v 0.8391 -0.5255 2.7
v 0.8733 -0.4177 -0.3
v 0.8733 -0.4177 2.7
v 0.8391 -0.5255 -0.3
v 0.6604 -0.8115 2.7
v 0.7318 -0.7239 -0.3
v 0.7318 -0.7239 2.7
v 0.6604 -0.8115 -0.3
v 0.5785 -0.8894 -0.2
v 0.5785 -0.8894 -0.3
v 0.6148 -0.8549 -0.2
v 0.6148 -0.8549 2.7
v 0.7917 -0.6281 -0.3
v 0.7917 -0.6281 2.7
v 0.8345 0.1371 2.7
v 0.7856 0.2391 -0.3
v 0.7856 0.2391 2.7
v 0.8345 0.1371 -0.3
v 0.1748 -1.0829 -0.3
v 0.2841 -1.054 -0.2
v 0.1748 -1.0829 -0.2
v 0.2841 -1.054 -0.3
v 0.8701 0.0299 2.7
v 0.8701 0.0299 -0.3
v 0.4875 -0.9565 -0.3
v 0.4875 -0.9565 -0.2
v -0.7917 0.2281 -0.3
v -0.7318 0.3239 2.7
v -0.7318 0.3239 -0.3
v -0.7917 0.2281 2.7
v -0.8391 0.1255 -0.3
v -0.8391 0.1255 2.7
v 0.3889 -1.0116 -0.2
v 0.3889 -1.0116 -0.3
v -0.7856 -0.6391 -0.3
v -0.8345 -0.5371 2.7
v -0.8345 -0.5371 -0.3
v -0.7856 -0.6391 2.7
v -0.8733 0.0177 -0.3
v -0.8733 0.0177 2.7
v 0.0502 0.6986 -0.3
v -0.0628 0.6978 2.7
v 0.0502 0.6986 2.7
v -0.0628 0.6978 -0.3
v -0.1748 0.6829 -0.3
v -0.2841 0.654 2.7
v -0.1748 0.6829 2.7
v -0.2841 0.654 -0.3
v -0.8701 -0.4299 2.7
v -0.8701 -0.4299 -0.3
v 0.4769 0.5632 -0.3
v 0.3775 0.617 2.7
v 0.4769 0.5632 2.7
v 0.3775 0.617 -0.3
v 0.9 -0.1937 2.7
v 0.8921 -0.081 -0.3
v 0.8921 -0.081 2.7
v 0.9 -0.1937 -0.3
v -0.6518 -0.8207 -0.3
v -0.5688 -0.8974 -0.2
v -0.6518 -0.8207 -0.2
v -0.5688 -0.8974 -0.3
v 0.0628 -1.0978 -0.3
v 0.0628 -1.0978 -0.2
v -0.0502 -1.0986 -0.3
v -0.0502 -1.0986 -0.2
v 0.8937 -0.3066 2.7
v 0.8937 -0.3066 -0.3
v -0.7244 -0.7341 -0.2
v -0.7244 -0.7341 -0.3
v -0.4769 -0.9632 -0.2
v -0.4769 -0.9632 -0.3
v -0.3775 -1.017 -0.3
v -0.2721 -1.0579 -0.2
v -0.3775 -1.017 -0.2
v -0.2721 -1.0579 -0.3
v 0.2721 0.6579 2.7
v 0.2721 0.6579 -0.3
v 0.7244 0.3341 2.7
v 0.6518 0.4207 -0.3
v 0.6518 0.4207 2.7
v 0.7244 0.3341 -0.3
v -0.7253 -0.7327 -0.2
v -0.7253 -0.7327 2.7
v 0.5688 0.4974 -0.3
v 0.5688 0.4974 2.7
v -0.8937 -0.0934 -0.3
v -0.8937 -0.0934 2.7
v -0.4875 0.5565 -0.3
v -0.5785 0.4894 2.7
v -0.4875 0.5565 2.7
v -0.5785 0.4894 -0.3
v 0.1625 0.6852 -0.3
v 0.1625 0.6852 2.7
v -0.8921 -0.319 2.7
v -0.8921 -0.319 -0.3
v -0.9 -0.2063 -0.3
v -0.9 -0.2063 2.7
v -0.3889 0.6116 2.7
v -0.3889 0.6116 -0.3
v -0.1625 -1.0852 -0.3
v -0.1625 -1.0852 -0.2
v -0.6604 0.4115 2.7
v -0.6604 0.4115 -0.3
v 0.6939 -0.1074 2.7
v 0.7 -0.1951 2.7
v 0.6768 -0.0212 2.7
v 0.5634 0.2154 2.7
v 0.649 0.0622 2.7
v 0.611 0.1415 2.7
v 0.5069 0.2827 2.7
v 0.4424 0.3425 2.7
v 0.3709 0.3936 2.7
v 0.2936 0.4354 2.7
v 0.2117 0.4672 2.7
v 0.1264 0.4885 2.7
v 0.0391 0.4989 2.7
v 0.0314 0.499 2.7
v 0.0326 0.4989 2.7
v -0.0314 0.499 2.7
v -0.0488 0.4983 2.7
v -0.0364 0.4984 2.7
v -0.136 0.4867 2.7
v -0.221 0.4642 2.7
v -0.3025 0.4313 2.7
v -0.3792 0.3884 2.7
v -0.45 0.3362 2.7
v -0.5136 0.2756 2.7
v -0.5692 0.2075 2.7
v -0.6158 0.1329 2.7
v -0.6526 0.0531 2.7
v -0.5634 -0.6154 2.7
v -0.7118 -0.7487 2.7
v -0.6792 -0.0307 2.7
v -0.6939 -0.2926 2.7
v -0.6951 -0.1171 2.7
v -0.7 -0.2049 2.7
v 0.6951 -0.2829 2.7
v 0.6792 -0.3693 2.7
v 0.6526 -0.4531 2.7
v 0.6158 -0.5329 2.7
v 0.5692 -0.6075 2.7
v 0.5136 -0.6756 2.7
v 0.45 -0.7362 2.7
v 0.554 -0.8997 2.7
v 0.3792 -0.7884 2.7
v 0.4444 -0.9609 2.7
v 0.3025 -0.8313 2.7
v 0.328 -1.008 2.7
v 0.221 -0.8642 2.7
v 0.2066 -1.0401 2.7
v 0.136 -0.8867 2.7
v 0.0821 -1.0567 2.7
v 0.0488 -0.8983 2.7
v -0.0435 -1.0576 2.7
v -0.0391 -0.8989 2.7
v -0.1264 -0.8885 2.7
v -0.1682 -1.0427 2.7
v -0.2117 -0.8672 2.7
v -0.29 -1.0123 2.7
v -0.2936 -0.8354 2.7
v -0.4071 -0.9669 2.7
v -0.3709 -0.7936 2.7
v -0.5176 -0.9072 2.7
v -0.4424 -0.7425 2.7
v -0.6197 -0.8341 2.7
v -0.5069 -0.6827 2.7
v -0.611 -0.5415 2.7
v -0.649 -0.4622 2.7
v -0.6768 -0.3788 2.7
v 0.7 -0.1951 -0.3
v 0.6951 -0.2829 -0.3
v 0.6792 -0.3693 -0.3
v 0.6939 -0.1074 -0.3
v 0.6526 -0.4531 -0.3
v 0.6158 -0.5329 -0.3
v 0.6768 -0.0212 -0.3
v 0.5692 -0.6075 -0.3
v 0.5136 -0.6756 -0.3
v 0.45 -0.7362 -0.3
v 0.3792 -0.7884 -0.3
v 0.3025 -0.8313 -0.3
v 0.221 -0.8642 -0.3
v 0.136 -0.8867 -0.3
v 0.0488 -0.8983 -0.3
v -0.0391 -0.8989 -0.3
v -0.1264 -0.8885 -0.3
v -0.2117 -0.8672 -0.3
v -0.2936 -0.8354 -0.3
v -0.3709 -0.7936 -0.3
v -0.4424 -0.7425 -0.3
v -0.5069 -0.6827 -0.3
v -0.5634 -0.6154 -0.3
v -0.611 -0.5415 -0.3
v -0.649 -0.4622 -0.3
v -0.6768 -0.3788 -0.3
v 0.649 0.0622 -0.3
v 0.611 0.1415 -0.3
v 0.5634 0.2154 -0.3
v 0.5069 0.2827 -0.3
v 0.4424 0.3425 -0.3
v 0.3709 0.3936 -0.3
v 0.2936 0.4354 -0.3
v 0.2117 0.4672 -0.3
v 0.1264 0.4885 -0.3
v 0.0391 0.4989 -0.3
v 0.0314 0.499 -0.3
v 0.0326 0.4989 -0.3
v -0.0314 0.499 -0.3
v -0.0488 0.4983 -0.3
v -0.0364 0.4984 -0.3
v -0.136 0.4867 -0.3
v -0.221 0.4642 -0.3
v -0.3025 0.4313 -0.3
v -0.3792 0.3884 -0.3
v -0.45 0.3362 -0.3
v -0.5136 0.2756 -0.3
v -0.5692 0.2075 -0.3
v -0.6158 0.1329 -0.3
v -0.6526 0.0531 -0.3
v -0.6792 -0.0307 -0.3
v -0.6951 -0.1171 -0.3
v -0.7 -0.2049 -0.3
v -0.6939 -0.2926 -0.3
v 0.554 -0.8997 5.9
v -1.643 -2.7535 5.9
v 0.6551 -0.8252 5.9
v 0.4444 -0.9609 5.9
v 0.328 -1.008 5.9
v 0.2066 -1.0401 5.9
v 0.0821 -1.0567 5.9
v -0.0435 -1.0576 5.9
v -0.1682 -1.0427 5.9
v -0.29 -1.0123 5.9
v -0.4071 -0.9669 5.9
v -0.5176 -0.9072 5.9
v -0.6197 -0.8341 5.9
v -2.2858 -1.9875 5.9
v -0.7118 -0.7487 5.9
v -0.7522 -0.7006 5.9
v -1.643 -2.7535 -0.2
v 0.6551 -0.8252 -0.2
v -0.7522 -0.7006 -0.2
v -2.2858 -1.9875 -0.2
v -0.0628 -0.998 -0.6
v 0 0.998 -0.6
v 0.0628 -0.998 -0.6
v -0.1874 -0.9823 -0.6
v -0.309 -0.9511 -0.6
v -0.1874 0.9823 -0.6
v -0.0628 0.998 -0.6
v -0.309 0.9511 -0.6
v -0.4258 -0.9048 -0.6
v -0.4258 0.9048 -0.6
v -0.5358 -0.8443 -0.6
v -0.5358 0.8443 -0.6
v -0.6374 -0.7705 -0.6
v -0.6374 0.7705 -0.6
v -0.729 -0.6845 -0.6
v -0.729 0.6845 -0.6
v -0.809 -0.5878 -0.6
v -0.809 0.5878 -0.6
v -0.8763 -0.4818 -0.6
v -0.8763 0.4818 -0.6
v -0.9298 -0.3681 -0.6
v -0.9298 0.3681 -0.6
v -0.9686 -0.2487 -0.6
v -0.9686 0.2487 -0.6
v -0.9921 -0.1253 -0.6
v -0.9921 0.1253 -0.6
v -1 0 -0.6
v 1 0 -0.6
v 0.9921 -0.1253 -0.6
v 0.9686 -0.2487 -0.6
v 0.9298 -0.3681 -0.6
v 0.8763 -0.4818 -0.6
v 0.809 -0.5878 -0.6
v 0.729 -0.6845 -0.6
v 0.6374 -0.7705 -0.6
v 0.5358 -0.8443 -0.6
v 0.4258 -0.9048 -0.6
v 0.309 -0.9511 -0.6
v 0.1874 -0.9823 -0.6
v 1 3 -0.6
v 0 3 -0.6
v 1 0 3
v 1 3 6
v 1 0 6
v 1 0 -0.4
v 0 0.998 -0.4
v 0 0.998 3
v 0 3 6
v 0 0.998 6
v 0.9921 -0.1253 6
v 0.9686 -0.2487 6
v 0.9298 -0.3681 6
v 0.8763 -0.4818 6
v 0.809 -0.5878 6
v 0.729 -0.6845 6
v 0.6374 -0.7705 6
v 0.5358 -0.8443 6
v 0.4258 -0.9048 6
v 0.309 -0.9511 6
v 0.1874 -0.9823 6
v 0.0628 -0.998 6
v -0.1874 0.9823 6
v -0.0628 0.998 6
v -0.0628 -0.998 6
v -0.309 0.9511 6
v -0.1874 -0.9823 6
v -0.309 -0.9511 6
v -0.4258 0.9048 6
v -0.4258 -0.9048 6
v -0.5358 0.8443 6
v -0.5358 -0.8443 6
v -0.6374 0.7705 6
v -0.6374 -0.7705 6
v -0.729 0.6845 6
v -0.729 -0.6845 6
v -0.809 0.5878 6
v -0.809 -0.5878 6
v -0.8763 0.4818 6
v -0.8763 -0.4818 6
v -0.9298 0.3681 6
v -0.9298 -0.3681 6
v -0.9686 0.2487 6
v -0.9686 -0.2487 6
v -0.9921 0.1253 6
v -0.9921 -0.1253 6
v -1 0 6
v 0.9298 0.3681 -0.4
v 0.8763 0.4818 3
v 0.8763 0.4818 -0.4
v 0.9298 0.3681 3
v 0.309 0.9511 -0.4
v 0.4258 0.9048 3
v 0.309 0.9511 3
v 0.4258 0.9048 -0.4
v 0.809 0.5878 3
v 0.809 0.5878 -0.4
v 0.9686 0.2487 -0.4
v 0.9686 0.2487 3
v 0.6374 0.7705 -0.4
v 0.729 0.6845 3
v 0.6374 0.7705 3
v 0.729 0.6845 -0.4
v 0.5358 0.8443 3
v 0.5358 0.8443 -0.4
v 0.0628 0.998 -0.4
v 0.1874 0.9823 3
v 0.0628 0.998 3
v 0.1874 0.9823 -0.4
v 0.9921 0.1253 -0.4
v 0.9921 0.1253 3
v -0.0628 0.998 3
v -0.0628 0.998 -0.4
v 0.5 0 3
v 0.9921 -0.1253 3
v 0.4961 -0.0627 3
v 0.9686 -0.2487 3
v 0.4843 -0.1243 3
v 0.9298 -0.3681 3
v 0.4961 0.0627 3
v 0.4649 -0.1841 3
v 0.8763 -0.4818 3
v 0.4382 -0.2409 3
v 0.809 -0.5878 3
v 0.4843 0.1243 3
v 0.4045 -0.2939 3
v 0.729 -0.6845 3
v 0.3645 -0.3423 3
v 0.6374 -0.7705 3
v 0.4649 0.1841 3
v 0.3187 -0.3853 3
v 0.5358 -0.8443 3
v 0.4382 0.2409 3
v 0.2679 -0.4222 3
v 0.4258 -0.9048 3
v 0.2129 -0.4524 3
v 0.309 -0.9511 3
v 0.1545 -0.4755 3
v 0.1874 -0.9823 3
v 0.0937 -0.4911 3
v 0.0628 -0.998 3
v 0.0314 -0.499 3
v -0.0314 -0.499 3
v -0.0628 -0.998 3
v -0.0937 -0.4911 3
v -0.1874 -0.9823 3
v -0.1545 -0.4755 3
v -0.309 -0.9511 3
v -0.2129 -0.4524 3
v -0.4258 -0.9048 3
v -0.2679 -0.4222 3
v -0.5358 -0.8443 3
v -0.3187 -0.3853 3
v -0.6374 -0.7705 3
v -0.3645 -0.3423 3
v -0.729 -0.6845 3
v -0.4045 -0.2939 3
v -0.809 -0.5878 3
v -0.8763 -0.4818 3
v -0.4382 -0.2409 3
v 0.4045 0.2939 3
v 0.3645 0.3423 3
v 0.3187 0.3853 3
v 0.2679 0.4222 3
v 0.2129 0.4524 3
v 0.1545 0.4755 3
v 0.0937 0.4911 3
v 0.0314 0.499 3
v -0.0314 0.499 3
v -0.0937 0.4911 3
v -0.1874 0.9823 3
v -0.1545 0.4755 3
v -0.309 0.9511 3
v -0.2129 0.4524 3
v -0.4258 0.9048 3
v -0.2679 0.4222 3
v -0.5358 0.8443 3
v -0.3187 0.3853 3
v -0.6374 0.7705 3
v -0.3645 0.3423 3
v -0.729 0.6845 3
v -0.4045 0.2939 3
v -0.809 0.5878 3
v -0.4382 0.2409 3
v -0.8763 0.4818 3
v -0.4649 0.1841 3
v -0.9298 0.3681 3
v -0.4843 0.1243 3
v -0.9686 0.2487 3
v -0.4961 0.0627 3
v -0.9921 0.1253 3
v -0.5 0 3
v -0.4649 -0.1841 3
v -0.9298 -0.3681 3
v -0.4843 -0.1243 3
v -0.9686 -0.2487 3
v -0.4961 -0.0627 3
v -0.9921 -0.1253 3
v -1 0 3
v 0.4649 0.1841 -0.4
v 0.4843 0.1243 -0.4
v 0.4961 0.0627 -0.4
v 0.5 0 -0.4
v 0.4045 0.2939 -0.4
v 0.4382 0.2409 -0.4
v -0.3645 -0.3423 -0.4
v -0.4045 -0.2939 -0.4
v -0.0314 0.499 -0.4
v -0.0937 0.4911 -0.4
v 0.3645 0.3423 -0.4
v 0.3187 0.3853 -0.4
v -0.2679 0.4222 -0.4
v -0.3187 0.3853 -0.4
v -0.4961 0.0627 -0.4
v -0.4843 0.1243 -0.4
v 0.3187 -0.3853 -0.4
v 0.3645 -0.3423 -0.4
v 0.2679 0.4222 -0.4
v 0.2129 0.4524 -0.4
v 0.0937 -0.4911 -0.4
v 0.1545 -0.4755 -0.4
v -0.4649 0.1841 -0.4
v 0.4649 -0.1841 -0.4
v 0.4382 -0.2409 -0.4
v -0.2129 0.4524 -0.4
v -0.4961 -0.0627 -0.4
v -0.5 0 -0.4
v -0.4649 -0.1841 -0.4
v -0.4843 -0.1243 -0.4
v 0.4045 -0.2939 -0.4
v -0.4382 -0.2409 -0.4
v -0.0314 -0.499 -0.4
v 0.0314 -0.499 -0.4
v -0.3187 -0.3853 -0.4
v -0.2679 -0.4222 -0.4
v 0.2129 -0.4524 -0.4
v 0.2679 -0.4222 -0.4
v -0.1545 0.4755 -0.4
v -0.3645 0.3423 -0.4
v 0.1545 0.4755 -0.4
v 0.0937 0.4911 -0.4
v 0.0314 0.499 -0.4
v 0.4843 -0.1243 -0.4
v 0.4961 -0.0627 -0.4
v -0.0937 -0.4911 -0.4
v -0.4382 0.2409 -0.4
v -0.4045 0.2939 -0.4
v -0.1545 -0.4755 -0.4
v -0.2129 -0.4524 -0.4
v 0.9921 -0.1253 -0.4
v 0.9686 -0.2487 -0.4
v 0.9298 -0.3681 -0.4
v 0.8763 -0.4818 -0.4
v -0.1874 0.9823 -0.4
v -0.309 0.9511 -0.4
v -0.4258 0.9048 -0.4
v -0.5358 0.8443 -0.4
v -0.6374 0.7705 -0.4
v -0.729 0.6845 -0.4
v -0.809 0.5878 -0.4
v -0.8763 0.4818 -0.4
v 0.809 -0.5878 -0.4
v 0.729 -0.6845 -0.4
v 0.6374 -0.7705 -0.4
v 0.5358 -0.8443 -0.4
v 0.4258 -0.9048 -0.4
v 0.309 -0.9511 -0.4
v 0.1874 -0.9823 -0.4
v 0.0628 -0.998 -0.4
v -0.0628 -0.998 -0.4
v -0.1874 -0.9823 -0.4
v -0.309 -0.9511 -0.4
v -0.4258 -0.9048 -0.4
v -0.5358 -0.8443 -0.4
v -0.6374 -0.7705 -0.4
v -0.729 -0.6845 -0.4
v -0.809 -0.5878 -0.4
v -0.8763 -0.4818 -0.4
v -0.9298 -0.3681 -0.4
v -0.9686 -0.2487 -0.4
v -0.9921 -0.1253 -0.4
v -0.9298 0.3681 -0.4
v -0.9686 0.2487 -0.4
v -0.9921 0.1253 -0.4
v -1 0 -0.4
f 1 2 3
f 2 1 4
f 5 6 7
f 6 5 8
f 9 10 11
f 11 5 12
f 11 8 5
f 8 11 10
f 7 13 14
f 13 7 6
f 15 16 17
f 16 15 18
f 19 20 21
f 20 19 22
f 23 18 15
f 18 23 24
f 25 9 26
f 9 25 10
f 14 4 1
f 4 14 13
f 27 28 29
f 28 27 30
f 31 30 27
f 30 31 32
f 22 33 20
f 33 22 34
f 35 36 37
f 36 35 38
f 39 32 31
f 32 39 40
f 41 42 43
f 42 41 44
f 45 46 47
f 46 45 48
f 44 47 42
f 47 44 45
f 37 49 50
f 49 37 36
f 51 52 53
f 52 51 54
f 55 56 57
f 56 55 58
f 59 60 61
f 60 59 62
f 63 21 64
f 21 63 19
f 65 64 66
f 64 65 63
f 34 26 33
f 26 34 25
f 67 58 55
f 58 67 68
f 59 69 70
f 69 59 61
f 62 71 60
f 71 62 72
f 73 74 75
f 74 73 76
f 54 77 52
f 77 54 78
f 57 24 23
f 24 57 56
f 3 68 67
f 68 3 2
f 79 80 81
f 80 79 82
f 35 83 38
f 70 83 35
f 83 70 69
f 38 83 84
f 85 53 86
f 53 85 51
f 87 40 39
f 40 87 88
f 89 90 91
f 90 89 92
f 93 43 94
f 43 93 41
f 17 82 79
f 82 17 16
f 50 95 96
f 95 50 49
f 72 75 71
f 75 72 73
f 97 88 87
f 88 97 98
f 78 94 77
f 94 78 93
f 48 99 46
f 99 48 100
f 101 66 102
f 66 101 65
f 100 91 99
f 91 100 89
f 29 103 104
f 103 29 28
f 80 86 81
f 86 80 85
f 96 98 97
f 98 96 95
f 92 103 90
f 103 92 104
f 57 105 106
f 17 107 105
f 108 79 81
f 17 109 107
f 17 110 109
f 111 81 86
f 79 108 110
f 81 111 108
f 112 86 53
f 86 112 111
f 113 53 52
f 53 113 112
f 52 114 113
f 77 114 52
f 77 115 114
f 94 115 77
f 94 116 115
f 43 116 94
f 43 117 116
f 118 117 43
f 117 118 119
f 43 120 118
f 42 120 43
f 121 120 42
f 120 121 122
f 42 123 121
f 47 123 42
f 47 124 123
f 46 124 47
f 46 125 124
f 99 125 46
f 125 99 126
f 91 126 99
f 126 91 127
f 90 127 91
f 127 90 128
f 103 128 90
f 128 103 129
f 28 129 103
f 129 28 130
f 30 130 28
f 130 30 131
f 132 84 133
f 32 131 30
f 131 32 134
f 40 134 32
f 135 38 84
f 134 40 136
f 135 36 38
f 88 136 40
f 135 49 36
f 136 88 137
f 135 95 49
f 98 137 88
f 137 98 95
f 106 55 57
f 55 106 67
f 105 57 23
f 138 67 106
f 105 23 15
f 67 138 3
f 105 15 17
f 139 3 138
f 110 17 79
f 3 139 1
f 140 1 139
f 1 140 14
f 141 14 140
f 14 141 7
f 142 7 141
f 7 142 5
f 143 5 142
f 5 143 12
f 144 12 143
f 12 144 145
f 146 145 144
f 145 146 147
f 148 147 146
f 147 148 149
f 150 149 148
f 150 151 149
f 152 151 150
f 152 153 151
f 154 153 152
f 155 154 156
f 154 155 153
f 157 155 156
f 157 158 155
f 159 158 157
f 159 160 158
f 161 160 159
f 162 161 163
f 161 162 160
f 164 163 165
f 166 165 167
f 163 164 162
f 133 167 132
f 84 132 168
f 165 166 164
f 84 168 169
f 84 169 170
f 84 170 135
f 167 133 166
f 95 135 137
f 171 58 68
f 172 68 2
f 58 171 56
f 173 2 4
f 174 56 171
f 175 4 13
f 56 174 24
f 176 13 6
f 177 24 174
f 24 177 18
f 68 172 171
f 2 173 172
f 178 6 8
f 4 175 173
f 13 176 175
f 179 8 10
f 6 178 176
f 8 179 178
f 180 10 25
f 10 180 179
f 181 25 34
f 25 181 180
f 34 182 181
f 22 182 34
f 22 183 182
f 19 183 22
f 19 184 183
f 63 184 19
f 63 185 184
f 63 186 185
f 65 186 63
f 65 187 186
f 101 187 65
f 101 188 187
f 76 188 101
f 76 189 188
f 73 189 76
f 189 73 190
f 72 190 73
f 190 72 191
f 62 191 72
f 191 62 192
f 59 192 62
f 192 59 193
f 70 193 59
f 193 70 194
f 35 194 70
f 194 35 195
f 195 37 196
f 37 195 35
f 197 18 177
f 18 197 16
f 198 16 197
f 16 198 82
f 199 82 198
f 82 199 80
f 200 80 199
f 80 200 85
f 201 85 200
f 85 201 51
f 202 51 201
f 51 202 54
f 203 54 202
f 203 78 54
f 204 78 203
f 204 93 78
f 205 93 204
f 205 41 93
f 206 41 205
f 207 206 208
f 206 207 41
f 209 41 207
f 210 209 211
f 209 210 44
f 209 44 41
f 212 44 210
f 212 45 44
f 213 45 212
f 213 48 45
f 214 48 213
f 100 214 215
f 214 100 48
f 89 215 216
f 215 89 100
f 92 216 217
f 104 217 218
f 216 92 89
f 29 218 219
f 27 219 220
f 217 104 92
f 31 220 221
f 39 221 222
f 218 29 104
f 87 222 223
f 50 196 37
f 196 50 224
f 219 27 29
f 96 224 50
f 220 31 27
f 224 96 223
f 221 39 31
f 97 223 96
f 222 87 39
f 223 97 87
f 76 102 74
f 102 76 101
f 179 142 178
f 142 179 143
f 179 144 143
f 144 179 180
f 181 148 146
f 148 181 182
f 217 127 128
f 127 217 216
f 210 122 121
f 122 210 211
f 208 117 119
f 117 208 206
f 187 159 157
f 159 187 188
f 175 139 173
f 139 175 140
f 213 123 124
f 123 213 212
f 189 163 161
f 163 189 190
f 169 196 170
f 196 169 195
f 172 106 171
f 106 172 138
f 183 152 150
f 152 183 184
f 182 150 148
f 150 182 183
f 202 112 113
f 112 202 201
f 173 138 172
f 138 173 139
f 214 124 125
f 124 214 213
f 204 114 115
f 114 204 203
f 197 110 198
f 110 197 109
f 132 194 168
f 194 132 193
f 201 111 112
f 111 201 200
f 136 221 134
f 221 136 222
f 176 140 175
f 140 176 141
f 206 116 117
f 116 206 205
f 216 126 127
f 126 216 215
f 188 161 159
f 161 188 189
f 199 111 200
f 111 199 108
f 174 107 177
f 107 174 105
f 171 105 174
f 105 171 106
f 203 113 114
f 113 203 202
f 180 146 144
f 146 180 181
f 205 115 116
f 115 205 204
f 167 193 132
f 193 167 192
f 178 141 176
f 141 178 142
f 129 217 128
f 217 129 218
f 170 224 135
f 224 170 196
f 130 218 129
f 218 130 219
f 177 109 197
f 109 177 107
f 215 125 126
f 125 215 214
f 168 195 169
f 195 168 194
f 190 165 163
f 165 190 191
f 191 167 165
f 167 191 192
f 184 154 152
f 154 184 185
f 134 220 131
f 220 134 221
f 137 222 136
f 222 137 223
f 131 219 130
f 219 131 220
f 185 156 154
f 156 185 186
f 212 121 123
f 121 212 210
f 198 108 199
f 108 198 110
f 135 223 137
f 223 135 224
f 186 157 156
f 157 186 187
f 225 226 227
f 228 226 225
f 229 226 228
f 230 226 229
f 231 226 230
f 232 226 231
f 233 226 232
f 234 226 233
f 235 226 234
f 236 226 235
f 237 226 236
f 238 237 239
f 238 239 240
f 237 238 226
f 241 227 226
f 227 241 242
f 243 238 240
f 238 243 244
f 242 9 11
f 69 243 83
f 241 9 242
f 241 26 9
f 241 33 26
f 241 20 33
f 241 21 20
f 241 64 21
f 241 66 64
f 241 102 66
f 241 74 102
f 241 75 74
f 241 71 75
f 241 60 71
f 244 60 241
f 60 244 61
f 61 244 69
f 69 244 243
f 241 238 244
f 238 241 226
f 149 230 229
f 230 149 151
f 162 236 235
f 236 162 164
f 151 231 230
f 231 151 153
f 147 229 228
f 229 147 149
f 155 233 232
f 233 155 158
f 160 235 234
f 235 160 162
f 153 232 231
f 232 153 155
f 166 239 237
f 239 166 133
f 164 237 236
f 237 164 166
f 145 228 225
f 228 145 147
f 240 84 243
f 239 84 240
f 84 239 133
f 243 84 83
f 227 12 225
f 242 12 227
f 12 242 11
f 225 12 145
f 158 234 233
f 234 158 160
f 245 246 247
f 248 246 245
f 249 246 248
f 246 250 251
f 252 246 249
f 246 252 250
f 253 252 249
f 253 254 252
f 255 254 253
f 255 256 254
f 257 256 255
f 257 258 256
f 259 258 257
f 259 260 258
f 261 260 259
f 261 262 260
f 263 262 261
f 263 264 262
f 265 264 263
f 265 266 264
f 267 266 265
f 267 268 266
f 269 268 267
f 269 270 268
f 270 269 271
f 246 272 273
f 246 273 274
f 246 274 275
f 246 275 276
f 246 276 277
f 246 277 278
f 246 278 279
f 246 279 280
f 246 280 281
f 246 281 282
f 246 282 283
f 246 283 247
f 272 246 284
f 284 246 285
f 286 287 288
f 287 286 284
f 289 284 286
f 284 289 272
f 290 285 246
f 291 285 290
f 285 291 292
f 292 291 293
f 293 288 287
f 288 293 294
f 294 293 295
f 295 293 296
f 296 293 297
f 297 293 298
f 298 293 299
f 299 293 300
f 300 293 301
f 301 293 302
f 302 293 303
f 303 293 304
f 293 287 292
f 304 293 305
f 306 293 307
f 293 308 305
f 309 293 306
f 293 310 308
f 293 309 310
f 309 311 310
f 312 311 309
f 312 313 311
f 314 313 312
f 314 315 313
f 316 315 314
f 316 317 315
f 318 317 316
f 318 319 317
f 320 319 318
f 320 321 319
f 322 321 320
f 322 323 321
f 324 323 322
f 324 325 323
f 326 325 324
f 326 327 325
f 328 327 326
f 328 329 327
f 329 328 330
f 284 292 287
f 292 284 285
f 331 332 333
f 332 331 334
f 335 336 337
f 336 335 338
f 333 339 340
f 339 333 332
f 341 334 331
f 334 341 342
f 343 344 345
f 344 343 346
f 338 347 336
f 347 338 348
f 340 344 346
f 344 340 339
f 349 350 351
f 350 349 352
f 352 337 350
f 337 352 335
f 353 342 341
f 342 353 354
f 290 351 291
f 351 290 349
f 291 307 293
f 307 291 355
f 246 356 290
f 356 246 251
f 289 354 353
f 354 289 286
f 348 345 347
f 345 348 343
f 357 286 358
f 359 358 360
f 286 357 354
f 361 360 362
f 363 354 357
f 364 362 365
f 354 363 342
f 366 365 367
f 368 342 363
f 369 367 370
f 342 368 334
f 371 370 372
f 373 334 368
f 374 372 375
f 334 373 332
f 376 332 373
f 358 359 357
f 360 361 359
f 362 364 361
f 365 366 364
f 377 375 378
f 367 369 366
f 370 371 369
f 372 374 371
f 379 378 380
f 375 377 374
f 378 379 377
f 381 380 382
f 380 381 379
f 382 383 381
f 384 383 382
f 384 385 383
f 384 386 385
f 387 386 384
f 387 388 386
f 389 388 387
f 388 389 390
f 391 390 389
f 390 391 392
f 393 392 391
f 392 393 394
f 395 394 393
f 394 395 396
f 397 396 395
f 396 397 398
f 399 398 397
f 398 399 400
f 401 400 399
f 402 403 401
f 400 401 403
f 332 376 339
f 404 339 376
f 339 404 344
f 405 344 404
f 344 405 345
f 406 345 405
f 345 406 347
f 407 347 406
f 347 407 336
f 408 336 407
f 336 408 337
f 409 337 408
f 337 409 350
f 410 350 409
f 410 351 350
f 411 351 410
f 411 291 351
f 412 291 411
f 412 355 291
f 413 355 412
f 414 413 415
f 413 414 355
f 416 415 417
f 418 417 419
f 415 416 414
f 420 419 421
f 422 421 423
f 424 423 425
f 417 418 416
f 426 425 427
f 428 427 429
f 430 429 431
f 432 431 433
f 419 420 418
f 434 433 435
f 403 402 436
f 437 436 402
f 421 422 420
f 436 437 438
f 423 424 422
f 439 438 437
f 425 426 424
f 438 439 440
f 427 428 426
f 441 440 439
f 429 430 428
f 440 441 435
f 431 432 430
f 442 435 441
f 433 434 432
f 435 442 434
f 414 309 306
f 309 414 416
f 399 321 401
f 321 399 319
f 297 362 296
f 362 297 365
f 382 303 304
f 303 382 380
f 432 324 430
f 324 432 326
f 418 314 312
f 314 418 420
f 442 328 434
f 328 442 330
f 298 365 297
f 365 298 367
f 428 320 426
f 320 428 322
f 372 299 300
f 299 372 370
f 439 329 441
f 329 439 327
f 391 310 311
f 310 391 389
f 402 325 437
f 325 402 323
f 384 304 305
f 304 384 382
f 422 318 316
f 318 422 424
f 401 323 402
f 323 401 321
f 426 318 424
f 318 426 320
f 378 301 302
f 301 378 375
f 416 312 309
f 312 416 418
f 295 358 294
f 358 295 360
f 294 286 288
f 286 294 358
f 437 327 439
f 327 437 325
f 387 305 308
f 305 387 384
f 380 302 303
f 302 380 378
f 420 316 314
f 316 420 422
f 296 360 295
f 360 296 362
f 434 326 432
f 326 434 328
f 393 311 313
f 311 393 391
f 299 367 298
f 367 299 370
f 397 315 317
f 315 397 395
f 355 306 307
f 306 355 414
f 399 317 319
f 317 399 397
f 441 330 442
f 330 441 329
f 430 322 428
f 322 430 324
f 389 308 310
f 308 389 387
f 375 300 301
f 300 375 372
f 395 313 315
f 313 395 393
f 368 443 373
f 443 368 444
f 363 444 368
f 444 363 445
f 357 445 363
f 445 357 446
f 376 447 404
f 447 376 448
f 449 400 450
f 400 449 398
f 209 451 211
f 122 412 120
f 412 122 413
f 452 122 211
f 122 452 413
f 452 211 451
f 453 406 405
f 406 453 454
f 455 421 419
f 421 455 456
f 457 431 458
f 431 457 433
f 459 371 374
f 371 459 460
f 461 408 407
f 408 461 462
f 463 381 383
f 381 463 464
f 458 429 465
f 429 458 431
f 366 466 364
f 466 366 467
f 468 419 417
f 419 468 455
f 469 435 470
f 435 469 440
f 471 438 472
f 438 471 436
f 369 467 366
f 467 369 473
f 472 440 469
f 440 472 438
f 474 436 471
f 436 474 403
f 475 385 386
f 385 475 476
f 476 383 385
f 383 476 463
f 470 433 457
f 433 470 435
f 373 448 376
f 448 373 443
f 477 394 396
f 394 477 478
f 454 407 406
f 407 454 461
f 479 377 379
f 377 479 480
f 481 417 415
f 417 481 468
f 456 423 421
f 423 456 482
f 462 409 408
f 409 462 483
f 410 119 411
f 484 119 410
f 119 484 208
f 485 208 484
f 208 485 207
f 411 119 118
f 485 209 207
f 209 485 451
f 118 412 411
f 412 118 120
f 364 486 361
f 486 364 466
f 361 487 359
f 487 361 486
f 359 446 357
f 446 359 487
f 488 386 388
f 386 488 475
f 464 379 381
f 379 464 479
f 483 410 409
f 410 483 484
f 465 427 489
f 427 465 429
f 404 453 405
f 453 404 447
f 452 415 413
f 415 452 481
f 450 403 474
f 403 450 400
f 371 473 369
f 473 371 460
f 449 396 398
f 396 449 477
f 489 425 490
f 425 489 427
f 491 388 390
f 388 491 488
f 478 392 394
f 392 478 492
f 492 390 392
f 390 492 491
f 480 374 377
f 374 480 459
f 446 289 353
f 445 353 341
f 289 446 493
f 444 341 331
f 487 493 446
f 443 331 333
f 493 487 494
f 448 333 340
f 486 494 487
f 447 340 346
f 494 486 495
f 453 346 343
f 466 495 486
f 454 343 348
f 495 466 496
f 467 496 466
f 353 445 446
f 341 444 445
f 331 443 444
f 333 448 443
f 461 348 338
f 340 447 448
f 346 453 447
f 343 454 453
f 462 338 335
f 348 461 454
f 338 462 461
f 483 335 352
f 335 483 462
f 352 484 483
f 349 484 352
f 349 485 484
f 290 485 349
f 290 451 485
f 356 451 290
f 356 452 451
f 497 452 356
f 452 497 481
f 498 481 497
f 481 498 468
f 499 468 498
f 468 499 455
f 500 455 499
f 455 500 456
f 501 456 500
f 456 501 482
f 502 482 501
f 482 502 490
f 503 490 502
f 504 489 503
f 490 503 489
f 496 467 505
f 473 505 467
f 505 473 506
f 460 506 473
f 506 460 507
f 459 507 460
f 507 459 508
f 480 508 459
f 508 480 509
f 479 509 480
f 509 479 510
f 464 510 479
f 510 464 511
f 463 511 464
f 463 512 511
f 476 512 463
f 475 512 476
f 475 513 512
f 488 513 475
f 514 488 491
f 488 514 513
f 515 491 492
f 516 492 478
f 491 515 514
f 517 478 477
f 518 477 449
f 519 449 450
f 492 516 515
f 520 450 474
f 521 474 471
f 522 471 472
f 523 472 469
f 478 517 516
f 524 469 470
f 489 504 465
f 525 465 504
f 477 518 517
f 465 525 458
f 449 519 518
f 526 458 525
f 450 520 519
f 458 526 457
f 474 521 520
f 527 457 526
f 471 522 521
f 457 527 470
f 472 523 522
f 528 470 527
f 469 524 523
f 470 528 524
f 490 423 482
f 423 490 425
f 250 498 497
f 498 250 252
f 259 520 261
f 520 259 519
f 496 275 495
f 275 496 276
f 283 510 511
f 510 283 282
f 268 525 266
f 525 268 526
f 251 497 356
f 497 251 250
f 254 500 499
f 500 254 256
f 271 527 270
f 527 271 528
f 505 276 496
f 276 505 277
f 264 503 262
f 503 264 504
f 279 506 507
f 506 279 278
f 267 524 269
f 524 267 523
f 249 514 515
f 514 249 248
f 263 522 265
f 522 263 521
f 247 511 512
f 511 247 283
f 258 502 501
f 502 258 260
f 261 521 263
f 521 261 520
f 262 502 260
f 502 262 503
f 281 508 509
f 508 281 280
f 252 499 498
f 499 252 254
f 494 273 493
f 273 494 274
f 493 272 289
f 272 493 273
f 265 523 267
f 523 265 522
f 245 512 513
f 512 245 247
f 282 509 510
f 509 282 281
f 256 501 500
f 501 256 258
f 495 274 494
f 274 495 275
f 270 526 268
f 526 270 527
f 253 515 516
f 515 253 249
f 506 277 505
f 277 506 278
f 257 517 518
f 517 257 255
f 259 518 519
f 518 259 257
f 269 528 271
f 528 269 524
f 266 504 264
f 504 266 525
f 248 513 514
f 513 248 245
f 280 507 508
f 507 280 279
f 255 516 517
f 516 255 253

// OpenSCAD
module block_long() { //long block
	difference(){
 		cube([6.6, 3, 1]);
 		
 		translate([-1,0,0])
 			rotate([0,270,180])
 			cylinder(h=8, r=1, $fn=50);
 	}
 }
 
 module block_short() { //long block
 	difference(){
 		cube([6.1,3,1]);
 		
 		translate([-1,0,0])
 			rotate([0,270,180])
 			cylinder(h=8, r=1, $fn=50);
 	}
 }
 
 module cylinder_bottom(){
 	difference(){
 		cylinder(h=3, r=0.9, $fn=50);
 
 		translate([0,0,-1])
 			cylinder(h=8, r=0.7, $fn=50);
 	}
 
 	translate([-.1, .1, .1])
 	rotate([0,270,180])
 		block_short();
 }
 
 module cylinder_top(){
 
 	translate([0,0,3])
 		cylinder(h=3, r=1, $fn=50);
 	translate([0,0,-.4]) //innder dowel
 		cylinder(h=6.4, r=.5, $fn=50);
 
 	translate([0, 0, 6])
 		rotate([0,90,0])
 			block_long();
 	translate([0,0,-.6])
 
 	cylinder(h=.2, r=1, $fn=50);
 }
 
 color("blue")
 translate([0,-.2,-0.3])
 	rotate([0,0, -50])
 	cylinder_bottom();
 
 
 cylinder_top();
